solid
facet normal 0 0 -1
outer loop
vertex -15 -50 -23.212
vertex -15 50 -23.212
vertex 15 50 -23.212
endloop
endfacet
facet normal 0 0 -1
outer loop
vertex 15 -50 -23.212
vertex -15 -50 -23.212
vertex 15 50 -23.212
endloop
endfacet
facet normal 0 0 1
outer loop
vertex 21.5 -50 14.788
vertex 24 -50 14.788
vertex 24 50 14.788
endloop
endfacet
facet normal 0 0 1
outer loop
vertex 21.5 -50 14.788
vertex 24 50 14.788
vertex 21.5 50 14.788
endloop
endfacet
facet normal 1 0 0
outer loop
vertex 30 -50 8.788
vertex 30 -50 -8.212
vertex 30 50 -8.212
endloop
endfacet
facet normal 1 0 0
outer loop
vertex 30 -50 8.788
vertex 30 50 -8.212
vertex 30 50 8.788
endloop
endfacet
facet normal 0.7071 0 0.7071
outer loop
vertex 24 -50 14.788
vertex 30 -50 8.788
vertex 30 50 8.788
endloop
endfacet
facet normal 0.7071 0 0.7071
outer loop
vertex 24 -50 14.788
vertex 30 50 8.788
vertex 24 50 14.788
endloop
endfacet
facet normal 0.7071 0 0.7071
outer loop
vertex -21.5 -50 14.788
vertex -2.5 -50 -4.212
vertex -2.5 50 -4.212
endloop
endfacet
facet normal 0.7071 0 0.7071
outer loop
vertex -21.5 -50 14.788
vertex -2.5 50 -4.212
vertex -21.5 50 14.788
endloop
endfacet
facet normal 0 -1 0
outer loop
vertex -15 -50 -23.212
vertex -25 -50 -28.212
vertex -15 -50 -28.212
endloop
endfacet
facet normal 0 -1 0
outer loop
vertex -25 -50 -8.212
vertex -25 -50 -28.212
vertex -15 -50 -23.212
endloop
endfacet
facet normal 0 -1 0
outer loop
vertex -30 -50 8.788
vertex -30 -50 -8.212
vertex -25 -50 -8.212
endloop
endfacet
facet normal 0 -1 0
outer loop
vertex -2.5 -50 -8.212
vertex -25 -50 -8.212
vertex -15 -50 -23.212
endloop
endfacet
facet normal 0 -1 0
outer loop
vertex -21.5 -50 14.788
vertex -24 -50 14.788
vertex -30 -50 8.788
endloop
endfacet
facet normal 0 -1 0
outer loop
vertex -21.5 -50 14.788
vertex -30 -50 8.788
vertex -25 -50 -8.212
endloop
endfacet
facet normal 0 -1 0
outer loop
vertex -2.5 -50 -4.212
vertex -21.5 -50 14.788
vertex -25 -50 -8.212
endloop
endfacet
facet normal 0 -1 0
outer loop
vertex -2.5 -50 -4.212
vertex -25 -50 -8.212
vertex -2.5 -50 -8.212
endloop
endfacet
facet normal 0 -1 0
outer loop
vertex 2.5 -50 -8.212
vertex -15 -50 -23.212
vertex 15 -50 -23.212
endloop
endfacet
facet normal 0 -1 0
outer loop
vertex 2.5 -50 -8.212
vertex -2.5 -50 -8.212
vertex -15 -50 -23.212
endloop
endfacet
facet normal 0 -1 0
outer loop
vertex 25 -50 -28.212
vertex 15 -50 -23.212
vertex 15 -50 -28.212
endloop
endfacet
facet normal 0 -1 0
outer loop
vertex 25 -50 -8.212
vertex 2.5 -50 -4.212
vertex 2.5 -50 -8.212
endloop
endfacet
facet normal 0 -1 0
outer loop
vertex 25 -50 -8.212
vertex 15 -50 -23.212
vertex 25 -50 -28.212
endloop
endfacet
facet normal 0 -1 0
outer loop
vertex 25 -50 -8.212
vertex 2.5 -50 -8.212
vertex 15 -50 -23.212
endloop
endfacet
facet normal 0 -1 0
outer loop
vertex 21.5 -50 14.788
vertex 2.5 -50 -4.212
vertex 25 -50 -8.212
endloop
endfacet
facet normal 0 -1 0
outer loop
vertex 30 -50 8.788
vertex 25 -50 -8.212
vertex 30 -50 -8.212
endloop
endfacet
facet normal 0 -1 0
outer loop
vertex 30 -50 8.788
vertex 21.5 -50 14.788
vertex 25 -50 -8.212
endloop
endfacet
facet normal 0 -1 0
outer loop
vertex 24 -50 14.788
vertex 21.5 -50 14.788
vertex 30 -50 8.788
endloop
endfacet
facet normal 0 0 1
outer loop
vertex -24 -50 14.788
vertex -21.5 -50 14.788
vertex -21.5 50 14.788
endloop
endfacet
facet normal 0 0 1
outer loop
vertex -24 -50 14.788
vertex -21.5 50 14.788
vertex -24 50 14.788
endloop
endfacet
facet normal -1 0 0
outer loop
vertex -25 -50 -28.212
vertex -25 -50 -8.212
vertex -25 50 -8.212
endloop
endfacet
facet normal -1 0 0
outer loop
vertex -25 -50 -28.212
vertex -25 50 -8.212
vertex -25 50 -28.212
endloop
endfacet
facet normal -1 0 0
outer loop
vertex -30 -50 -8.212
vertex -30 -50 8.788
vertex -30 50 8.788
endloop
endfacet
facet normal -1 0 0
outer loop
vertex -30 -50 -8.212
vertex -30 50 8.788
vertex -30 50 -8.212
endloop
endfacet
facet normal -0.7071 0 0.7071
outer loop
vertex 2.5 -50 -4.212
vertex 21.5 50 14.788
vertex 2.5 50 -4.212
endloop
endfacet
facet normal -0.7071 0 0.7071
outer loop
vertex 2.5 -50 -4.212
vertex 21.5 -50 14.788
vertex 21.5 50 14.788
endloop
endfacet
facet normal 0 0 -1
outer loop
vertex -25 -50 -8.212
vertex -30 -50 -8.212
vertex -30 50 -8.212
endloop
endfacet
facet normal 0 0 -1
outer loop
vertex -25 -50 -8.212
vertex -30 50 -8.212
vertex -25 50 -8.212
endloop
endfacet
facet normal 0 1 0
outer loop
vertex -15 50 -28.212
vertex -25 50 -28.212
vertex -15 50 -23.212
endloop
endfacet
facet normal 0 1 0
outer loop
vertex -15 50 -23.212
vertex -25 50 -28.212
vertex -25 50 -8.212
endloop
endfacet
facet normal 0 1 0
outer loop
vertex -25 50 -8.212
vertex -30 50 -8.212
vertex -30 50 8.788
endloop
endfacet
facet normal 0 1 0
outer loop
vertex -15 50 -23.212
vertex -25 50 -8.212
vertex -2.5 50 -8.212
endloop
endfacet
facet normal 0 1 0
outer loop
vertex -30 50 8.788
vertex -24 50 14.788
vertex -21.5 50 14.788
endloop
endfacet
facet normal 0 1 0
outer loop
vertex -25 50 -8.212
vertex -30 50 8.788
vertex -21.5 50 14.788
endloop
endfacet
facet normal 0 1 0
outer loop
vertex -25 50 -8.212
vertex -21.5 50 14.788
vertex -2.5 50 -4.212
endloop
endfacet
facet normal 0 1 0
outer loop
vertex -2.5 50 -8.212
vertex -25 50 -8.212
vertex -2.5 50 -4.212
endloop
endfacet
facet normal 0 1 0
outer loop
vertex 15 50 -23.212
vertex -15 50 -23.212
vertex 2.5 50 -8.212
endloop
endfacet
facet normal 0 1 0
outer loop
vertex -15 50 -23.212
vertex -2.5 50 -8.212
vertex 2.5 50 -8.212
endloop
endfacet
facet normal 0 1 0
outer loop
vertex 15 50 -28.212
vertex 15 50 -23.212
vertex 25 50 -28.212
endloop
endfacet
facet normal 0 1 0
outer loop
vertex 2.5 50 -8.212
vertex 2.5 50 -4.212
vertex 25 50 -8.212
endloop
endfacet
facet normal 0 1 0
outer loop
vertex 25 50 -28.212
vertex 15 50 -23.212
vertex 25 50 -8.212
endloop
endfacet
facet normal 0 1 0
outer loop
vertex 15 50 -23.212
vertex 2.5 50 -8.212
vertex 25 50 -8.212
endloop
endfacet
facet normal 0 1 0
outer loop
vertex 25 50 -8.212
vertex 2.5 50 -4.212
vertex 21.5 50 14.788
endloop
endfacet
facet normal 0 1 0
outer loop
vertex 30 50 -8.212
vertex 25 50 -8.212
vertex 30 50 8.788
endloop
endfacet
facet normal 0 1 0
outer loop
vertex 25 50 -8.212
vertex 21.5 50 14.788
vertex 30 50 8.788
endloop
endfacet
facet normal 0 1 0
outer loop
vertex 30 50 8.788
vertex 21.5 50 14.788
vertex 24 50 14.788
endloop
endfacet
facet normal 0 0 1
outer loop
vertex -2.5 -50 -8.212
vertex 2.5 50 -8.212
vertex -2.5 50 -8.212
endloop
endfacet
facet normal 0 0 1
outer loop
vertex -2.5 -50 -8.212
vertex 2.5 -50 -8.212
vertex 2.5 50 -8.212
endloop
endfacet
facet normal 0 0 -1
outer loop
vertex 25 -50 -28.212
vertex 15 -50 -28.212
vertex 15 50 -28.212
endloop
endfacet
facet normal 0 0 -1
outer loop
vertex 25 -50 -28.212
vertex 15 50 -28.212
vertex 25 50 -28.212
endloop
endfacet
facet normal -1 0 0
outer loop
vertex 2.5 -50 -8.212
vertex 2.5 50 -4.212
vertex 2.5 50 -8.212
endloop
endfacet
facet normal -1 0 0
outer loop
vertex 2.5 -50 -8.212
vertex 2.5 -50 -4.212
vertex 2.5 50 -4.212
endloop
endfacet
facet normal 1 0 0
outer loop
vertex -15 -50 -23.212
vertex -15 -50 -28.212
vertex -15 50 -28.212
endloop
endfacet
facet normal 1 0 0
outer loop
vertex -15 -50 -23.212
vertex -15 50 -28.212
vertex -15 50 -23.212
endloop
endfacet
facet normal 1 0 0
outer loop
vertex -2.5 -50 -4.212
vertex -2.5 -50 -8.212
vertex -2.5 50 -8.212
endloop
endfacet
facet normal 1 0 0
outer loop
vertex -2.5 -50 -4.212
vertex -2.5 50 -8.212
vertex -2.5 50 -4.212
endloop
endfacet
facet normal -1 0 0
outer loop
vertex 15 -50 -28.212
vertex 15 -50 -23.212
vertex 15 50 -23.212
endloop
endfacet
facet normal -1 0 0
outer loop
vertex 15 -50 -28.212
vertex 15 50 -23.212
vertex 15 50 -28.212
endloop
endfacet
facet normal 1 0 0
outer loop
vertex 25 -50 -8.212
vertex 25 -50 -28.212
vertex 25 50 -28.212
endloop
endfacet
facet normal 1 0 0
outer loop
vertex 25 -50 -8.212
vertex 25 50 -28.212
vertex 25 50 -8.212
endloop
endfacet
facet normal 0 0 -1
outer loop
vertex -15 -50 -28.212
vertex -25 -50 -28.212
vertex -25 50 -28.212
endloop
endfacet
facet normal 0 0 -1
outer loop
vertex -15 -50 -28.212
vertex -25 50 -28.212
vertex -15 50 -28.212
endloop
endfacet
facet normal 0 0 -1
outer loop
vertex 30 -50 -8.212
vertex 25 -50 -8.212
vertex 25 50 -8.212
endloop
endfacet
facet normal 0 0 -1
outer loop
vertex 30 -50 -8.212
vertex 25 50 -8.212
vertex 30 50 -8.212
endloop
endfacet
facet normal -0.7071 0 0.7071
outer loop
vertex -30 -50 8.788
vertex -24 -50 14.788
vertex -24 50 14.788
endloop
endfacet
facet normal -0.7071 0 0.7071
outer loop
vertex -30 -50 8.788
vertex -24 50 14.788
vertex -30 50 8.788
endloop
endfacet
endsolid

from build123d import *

# Parameters (mm, degrees)
F1_DEPTH = 50


with BuildPart() as f1:
    # F0 (on Front) → F1 (new body, symmetric)
    with BuildSketch(Plane.XZ):
        Polygon((2.5, -8.212121), (0, -8.212121), (-2.5, -8.212121), (-2.5, -4.212121), (-21.5, 14.787879), (-24, 14.787879), (-30, 8.787879), (-30, -8.212121), (-25, -8.212121), (-25, -28.212121), (-15, -28.212121), (-15, -23.212121), (0, -23.212121), (15, -23.212121), (15, -28.212121), (25, -28.212121), (25, -8.212121), (30, -8.212121), (30, 8.787879), (24, 14.787879), (21.5, 14.787879), (2.5, -4.212121), align=None)
    extrude(amount=F1_DEPTH, both=True)


solid = f1.part
